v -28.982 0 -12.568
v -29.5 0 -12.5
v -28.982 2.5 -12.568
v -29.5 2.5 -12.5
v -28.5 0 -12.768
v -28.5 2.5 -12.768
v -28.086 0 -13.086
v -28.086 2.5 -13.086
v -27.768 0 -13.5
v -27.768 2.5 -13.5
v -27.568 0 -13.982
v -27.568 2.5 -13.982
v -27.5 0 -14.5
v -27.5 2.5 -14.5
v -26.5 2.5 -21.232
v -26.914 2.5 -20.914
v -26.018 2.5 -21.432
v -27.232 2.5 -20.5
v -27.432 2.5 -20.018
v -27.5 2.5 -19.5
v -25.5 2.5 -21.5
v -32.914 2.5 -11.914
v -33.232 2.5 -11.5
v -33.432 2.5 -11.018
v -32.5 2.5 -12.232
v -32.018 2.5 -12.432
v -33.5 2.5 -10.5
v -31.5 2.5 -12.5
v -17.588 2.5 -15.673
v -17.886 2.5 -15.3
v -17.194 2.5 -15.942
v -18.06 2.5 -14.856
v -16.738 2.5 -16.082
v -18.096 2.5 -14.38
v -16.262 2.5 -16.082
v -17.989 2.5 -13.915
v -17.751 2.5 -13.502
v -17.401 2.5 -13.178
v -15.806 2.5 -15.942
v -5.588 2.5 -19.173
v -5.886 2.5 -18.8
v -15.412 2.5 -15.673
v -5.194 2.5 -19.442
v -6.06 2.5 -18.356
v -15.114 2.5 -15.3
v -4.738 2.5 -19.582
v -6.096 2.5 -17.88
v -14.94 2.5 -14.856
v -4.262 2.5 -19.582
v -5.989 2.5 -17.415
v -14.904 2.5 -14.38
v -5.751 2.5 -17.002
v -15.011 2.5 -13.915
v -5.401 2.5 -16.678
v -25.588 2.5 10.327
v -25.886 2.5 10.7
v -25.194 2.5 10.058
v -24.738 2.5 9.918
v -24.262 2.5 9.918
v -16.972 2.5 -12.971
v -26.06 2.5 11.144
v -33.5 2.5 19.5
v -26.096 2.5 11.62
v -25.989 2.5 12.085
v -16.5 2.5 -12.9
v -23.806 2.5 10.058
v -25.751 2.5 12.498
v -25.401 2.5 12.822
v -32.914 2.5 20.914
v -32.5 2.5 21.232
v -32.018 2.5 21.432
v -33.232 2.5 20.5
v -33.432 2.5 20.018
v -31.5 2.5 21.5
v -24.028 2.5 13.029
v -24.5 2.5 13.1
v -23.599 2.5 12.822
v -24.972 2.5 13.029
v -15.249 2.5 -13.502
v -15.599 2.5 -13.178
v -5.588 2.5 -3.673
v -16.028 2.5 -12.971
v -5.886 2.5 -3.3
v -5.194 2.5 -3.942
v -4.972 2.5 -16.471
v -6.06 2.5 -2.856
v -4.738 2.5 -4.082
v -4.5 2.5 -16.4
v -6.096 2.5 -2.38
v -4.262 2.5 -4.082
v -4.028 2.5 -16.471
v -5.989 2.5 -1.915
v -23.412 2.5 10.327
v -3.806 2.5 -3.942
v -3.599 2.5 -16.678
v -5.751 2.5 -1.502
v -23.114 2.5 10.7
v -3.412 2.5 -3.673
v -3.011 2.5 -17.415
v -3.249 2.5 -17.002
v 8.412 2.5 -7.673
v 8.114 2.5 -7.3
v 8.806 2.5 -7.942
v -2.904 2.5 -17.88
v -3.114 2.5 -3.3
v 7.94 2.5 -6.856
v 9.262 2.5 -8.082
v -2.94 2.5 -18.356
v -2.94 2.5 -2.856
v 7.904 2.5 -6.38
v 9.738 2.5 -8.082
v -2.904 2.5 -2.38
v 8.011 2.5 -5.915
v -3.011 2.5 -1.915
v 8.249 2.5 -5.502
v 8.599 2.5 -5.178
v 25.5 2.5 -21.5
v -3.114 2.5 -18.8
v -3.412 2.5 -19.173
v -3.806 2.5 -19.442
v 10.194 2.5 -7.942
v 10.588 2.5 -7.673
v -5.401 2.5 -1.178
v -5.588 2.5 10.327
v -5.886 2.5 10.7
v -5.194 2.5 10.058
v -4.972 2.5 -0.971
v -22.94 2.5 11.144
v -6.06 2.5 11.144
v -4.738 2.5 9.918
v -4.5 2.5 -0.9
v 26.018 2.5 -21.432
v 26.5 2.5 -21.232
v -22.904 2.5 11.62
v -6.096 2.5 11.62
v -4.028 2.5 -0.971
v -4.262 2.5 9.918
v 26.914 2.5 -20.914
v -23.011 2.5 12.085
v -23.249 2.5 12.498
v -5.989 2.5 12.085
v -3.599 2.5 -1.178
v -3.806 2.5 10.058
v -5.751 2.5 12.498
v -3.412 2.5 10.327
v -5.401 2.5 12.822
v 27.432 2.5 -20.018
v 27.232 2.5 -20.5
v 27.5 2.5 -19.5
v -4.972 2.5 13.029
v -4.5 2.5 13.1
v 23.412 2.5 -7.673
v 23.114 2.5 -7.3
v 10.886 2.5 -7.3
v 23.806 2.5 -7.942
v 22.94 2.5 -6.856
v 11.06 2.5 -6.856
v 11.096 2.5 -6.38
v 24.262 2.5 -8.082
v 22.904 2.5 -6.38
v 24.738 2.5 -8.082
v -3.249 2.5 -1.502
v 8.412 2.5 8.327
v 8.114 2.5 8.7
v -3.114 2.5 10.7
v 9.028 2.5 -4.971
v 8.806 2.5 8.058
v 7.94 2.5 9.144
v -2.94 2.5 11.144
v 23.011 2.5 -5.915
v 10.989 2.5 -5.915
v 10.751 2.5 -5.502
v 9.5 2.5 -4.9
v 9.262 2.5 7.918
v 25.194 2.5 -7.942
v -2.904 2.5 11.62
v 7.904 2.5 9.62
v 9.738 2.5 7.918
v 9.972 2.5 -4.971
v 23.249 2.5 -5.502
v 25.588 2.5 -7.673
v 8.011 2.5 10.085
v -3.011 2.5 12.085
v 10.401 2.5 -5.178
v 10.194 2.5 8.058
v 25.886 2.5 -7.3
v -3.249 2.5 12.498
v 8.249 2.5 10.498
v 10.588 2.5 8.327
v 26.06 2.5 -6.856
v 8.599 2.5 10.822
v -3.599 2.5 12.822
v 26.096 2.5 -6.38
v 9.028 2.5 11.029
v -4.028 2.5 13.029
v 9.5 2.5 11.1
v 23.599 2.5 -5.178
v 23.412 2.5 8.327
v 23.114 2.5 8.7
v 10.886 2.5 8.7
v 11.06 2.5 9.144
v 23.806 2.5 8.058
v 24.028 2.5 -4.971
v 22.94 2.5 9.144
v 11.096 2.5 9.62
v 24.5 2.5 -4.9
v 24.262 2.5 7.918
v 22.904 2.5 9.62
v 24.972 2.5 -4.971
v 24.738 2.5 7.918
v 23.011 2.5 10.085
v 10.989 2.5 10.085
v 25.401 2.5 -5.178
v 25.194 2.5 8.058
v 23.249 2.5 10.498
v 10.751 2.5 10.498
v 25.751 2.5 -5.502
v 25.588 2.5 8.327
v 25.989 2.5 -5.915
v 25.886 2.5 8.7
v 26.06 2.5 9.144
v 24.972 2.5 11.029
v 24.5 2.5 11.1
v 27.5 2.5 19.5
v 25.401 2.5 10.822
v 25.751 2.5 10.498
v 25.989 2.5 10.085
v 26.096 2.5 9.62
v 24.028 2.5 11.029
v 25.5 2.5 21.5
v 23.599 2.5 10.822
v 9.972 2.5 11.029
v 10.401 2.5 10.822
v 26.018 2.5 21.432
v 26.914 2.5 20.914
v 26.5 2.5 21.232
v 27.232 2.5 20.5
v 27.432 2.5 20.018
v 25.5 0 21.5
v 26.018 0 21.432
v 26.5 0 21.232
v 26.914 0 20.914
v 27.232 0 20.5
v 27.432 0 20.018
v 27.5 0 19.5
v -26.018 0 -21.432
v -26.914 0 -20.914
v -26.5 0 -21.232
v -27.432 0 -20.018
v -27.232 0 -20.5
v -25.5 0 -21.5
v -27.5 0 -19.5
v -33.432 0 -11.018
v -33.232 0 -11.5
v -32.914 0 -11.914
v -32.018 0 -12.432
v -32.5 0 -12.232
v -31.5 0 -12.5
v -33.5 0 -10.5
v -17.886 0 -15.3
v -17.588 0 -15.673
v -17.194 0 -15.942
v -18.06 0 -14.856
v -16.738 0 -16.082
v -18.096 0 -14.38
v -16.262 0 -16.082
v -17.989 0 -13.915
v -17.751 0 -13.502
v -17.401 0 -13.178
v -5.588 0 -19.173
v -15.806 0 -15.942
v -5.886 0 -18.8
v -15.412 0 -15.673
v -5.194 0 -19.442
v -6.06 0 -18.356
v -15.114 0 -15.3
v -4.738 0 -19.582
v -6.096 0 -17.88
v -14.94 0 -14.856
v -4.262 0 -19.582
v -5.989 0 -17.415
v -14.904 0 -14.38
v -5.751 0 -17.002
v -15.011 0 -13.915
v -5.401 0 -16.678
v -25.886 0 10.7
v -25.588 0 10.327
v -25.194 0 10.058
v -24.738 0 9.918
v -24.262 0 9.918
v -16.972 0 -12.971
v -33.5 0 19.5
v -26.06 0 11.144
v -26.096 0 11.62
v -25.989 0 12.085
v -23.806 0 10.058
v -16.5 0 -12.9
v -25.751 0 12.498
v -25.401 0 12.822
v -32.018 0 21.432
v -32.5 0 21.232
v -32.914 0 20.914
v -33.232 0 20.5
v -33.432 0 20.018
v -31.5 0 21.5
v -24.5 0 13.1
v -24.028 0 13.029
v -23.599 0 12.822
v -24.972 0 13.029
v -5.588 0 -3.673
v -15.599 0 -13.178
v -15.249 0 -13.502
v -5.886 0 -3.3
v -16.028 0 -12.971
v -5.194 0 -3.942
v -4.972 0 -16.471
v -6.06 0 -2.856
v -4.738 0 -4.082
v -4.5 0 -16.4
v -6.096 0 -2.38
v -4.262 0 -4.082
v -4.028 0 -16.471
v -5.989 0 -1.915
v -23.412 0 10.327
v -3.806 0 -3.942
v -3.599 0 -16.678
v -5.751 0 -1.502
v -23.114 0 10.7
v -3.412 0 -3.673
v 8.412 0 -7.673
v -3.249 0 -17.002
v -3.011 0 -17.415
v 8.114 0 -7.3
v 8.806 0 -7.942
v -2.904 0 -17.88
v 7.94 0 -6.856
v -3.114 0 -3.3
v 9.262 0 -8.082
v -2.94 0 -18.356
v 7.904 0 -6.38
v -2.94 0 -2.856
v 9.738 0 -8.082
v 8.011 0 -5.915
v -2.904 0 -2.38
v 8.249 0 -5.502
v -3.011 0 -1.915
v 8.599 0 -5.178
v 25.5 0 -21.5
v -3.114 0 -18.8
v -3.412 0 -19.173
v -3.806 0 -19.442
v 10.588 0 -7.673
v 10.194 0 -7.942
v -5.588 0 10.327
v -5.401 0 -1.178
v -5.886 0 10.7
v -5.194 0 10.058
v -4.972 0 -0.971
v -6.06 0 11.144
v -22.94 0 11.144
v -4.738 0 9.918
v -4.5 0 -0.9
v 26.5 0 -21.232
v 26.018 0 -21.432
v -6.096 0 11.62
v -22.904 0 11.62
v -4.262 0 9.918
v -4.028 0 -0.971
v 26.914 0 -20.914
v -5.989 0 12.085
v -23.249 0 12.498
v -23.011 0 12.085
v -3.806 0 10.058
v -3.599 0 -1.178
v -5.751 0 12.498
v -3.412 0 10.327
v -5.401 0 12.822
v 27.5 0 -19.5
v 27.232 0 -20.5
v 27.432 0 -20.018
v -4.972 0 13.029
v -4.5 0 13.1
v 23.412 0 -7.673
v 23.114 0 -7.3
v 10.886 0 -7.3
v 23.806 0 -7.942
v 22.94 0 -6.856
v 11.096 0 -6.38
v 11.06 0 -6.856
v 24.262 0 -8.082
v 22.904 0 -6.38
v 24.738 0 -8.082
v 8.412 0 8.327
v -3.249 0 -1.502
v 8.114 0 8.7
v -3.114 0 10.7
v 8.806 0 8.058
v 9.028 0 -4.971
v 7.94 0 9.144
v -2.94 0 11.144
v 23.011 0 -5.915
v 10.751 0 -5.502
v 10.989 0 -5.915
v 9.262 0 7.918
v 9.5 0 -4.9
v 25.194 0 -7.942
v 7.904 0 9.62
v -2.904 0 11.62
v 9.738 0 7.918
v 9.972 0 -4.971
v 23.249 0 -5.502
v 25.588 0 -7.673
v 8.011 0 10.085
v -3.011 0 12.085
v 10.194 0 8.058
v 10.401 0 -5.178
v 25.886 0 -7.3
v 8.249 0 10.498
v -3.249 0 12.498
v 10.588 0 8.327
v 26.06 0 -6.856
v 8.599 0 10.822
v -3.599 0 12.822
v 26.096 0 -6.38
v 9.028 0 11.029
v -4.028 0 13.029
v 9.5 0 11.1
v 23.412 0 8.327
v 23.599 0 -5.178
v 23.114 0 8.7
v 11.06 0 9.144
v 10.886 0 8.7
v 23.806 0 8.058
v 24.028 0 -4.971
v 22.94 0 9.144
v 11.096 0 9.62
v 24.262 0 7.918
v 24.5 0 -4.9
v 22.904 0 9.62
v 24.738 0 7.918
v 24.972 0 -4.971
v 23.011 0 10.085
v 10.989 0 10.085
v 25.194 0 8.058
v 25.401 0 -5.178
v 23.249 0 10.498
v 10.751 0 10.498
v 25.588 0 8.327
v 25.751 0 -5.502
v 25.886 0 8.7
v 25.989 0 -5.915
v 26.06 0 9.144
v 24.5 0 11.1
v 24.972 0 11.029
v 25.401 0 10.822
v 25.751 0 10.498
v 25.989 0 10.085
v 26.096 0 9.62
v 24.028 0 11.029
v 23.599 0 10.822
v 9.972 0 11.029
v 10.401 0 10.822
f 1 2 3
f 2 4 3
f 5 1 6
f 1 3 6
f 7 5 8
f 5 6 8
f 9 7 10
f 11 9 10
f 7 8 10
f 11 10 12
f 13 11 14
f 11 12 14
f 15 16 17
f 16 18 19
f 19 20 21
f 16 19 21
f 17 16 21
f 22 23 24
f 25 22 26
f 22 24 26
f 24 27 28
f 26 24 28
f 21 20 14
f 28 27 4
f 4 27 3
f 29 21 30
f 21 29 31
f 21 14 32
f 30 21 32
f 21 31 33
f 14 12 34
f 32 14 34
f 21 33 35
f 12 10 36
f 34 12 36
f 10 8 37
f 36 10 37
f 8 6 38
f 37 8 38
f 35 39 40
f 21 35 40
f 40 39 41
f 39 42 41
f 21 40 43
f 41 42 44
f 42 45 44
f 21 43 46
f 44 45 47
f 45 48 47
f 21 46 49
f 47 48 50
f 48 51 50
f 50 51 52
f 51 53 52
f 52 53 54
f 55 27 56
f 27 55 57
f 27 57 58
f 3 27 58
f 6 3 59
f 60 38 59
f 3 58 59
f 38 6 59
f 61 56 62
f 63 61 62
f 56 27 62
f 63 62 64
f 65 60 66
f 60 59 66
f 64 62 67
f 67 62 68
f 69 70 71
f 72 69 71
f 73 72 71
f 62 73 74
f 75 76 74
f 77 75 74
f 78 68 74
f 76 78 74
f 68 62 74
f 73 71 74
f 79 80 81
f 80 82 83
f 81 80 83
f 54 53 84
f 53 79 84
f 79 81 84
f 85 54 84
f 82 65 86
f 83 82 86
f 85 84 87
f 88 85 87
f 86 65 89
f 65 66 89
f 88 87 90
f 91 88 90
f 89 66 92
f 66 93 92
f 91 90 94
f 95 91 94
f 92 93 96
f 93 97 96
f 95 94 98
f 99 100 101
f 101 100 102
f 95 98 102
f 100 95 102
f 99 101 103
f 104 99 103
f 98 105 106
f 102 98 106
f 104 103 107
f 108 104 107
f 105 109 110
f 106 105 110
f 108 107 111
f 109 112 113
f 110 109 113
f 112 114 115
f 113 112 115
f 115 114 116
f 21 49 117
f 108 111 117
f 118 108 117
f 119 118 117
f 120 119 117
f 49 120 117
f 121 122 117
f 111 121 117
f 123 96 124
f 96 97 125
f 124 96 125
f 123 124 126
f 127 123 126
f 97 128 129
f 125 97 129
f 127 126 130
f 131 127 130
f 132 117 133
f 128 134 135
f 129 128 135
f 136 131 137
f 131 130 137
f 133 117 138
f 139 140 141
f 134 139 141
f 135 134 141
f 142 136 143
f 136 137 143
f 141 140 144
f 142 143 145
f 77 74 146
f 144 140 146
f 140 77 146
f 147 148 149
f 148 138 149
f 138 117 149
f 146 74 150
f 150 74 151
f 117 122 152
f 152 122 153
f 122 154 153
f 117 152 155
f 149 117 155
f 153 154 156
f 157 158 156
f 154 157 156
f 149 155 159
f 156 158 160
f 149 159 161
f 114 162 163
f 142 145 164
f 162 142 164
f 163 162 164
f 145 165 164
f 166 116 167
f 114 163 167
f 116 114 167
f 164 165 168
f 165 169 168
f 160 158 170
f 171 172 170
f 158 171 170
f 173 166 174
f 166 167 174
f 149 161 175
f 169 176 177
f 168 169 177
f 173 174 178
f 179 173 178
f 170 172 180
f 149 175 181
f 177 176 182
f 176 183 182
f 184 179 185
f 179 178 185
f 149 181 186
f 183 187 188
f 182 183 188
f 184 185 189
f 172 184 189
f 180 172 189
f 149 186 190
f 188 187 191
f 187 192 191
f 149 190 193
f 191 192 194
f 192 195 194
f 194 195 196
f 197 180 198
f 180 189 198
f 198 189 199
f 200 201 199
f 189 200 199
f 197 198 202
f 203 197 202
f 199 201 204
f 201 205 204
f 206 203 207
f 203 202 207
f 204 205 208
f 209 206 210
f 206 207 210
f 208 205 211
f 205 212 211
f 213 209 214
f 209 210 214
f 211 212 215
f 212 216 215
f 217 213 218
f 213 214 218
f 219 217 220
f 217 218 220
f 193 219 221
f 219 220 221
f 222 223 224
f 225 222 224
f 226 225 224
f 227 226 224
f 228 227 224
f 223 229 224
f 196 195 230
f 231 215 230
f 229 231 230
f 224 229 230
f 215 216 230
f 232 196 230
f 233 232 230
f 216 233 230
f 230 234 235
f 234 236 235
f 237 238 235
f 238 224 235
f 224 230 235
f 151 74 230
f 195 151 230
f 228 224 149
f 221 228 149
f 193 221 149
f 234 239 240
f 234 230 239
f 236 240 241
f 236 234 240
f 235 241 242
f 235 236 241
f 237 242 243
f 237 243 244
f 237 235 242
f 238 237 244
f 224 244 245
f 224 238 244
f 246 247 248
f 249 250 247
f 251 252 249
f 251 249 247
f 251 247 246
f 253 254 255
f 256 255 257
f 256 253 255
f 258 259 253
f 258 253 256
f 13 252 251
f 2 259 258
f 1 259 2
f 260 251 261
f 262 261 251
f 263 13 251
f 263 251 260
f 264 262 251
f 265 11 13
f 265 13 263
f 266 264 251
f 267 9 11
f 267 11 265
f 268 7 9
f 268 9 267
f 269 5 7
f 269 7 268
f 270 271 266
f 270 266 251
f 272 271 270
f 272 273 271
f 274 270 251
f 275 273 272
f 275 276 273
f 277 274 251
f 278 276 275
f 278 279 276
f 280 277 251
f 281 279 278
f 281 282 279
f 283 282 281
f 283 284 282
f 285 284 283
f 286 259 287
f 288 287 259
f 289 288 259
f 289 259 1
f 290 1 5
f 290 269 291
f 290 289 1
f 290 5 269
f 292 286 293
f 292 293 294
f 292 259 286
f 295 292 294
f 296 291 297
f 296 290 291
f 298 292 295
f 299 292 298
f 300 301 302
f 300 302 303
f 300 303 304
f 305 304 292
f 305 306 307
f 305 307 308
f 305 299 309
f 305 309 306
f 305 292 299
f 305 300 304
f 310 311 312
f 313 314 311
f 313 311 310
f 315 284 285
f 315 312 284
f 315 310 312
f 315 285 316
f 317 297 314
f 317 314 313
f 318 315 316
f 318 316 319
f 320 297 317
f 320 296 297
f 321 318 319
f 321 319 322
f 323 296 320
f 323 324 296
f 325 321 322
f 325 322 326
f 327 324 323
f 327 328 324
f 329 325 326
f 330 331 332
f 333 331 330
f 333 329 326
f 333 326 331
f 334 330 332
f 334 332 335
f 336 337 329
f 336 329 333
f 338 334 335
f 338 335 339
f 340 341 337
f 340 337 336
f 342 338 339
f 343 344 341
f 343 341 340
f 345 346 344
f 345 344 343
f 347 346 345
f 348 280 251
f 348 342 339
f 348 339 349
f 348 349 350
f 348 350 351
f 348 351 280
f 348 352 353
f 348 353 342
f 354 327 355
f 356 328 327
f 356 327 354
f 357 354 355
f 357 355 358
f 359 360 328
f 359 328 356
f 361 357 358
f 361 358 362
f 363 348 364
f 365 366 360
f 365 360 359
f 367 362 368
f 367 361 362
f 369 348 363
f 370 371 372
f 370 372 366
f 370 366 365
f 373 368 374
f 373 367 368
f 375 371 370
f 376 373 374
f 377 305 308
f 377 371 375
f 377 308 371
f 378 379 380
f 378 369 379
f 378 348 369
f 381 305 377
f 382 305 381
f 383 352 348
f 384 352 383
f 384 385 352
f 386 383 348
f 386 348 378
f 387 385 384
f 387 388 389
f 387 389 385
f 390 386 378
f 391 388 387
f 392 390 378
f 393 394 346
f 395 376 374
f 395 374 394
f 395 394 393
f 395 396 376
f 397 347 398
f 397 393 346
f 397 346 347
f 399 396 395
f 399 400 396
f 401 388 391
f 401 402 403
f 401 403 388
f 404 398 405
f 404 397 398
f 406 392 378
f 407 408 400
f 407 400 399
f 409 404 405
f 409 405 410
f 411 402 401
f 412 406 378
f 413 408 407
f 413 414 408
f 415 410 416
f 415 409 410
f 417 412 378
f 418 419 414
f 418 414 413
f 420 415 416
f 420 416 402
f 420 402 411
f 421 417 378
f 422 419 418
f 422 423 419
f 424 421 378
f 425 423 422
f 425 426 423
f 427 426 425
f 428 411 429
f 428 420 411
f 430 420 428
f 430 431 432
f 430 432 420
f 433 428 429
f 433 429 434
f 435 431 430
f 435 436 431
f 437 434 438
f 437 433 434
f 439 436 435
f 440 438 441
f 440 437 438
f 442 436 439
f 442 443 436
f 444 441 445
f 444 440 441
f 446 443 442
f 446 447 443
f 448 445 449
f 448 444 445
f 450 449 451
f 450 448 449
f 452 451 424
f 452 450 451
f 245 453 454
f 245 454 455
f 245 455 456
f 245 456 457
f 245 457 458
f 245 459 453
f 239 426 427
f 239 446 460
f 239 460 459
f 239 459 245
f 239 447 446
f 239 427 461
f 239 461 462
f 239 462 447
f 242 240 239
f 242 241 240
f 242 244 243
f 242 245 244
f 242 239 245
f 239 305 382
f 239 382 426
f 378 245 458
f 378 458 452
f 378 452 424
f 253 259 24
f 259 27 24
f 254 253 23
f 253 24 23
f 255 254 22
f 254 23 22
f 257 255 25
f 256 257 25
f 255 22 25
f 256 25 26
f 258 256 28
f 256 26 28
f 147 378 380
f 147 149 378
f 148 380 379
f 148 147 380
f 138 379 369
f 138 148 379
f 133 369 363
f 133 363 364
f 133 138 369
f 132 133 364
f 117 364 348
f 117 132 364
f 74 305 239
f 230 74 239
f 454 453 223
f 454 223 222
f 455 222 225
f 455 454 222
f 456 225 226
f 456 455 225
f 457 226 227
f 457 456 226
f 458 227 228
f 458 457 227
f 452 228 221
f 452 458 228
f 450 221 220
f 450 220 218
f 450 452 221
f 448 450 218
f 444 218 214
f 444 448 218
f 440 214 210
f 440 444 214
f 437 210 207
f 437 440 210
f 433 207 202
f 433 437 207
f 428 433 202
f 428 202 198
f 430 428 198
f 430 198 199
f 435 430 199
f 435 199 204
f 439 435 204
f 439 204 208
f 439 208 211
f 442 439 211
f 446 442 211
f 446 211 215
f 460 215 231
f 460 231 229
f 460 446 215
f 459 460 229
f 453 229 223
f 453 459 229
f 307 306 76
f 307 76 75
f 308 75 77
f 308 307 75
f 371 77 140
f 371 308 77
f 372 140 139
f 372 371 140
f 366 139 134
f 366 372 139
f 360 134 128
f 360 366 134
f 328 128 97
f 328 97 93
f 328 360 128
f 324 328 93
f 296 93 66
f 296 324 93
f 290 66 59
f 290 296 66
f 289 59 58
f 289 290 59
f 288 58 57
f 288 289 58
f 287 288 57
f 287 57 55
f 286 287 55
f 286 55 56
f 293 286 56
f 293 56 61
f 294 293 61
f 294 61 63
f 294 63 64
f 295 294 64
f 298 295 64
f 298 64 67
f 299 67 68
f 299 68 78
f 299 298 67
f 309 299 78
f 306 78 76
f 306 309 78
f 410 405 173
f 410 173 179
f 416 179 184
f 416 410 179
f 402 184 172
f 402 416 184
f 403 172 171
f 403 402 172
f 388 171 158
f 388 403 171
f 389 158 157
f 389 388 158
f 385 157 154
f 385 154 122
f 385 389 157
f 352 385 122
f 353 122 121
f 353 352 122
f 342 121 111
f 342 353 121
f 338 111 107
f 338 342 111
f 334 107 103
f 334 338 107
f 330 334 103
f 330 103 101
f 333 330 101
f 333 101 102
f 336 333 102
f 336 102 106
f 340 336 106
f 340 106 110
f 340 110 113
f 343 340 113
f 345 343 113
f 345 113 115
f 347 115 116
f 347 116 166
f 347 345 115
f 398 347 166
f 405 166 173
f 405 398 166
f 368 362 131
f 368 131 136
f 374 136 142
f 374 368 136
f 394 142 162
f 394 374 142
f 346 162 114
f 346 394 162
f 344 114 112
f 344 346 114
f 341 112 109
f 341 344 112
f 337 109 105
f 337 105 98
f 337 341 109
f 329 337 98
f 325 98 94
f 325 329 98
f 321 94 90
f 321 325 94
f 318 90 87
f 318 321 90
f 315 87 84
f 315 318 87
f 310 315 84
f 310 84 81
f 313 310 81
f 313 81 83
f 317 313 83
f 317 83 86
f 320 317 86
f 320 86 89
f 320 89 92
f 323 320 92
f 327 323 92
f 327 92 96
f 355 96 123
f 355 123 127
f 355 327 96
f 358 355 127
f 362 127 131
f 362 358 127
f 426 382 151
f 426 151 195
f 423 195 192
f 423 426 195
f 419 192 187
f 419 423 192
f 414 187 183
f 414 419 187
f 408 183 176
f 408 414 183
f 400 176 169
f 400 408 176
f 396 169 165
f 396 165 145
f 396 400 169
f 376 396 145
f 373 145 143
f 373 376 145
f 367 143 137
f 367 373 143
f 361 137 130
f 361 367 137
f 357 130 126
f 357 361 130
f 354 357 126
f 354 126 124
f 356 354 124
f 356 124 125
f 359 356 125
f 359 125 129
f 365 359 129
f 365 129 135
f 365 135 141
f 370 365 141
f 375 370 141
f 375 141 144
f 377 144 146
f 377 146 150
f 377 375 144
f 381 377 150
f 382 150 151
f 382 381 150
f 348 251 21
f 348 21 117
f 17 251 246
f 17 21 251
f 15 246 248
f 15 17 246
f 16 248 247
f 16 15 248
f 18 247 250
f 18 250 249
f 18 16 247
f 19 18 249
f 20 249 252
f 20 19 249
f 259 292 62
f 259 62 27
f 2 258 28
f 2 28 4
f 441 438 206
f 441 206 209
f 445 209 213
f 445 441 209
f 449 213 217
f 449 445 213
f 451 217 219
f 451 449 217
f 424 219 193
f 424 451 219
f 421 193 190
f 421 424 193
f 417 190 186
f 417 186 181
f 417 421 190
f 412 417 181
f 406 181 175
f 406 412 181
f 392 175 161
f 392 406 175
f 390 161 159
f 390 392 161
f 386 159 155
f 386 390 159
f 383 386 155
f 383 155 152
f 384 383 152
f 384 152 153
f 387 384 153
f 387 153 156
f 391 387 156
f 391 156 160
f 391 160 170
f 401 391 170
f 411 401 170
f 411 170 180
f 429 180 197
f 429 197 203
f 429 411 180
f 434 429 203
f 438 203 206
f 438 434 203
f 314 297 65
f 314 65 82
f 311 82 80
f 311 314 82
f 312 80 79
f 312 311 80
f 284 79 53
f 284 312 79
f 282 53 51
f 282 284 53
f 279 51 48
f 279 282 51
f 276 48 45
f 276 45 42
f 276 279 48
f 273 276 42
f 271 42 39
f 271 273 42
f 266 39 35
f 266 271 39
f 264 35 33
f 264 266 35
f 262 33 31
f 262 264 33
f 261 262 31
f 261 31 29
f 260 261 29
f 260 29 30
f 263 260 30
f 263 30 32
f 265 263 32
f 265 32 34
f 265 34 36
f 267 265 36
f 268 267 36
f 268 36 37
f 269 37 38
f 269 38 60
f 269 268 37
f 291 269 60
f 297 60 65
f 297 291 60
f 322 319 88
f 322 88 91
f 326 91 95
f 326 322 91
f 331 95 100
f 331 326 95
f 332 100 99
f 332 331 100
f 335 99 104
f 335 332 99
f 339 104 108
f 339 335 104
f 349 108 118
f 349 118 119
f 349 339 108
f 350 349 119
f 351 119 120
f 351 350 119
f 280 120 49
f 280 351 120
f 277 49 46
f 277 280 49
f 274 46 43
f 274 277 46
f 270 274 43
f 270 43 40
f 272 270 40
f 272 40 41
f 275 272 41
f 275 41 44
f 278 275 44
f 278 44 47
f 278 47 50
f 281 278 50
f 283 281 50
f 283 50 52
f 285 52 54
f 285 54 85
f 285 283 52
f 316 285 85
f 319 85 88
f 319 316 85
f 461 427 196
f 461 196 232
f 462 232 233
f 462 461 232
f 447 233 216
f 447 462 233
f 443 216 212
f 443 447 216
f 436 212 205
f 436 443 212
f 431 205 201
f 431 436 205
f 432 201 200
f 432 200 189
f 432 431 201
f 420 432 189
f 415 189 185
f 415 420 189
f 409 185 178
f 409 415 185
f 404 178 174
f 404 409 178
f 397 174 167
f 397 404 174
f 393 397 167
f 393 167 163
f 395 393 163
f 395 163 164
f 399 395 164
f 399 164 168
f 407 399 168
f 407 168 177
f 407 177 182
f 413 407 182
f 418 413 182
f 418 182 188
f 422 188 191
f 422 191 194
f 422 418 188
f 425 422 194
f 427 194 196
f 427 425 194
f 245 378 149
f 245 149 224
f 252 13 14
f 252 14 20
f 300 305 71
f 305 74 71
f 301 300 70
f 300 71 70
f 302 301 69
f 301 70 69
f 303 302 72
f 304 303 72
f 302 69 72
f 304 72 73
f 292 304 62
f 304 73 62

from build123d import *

# Parameters (mm, degrees)
SKETCH_1_R      = 1.6
EXTRUDE_1_DEPTH = 2.5
FILLET_1_R      = 2


with BuildPart() as part:
    # 草图1 → 凸台-拉伸1 (new body)
    with BuildSketch(Plane(origin=(0, 0, 0), x_dir=(-1, 0, 0), z_dir=(0, 1, 0))):
        Polygon((-27.5, 21.5), (27.5, 21.5), (33.5, 21.5), (33.5, -12.5), (27.5, -12.5), (27.5, -21.5), (-27.5, -21.5), align=None)
        with Locations(Location((-24.5, 9.5, 0), (0, 0, 90))):
            Circle(SKETCH_1_R, mode=Mode.SUBTRACT)
        with Locations(Location((-9.5, 9.5, 0), (0, 0, 90))):
            Circle(SKETCH_1_R, mode=Mode.SUBTRACT)
        with Locations(Location((-24.5, -6.5, 0), (0, 0, 90))):
            Circle(SKETCH_1_R, mode=Mode.SUBTRACT)
        with Locations(Location((-9.5, -6.5, 0), (0, 0, 90))):
            Circle(SKETCH_1_R, mode=Mode.SUBTRACT)
        with Locations(Location((4.5, -2.5, 0), (0, 0, 90))):
            Circle(SKETCH_1_R, mode=Mode.SUBTRACT)
        with Locations(Location((4.5, 11.5, 0), (0, 0, 90))):
            Circle(SKETCH_1_R, mode=Mode.SUBTRACT)
        with Locations(Location((24.5, 11.5, 0), (0, 0, 90))):
            Circle(SKETCH_1_R, mode=Mode.SUBTRACT)
        with Locations(Location((16.5, -14.5, 0), (0, 0, 90))):
            Circle(SKETCH_1_R, mode=Mode.SUBTRACT)
        with Locations(Location((4.5, -18, 0), (0, 0, 90))):
            Circle(SKETCH_1_R, mode=Mode.SUBTRACT)
    extrude(amount=EXTRUDE_1_DEPTH)

    # 圆角1
    fillet_1_edges = [part.edges().sort_by_distance(p)[0] for p in [
        (27.5, 1.25, 21.5),
        (-33.5, 1.25, 21.5),
        (-33.5, 1.25, -12.5),
        (-27.5, 1.25, -12.5),
        (-27.5, 1.25, -21.5),
        (27.5, 1.25, -21.5),
    ]]
    fillet(fillet_1_edges, radius=FILLET_1_R)


solid = part.part
